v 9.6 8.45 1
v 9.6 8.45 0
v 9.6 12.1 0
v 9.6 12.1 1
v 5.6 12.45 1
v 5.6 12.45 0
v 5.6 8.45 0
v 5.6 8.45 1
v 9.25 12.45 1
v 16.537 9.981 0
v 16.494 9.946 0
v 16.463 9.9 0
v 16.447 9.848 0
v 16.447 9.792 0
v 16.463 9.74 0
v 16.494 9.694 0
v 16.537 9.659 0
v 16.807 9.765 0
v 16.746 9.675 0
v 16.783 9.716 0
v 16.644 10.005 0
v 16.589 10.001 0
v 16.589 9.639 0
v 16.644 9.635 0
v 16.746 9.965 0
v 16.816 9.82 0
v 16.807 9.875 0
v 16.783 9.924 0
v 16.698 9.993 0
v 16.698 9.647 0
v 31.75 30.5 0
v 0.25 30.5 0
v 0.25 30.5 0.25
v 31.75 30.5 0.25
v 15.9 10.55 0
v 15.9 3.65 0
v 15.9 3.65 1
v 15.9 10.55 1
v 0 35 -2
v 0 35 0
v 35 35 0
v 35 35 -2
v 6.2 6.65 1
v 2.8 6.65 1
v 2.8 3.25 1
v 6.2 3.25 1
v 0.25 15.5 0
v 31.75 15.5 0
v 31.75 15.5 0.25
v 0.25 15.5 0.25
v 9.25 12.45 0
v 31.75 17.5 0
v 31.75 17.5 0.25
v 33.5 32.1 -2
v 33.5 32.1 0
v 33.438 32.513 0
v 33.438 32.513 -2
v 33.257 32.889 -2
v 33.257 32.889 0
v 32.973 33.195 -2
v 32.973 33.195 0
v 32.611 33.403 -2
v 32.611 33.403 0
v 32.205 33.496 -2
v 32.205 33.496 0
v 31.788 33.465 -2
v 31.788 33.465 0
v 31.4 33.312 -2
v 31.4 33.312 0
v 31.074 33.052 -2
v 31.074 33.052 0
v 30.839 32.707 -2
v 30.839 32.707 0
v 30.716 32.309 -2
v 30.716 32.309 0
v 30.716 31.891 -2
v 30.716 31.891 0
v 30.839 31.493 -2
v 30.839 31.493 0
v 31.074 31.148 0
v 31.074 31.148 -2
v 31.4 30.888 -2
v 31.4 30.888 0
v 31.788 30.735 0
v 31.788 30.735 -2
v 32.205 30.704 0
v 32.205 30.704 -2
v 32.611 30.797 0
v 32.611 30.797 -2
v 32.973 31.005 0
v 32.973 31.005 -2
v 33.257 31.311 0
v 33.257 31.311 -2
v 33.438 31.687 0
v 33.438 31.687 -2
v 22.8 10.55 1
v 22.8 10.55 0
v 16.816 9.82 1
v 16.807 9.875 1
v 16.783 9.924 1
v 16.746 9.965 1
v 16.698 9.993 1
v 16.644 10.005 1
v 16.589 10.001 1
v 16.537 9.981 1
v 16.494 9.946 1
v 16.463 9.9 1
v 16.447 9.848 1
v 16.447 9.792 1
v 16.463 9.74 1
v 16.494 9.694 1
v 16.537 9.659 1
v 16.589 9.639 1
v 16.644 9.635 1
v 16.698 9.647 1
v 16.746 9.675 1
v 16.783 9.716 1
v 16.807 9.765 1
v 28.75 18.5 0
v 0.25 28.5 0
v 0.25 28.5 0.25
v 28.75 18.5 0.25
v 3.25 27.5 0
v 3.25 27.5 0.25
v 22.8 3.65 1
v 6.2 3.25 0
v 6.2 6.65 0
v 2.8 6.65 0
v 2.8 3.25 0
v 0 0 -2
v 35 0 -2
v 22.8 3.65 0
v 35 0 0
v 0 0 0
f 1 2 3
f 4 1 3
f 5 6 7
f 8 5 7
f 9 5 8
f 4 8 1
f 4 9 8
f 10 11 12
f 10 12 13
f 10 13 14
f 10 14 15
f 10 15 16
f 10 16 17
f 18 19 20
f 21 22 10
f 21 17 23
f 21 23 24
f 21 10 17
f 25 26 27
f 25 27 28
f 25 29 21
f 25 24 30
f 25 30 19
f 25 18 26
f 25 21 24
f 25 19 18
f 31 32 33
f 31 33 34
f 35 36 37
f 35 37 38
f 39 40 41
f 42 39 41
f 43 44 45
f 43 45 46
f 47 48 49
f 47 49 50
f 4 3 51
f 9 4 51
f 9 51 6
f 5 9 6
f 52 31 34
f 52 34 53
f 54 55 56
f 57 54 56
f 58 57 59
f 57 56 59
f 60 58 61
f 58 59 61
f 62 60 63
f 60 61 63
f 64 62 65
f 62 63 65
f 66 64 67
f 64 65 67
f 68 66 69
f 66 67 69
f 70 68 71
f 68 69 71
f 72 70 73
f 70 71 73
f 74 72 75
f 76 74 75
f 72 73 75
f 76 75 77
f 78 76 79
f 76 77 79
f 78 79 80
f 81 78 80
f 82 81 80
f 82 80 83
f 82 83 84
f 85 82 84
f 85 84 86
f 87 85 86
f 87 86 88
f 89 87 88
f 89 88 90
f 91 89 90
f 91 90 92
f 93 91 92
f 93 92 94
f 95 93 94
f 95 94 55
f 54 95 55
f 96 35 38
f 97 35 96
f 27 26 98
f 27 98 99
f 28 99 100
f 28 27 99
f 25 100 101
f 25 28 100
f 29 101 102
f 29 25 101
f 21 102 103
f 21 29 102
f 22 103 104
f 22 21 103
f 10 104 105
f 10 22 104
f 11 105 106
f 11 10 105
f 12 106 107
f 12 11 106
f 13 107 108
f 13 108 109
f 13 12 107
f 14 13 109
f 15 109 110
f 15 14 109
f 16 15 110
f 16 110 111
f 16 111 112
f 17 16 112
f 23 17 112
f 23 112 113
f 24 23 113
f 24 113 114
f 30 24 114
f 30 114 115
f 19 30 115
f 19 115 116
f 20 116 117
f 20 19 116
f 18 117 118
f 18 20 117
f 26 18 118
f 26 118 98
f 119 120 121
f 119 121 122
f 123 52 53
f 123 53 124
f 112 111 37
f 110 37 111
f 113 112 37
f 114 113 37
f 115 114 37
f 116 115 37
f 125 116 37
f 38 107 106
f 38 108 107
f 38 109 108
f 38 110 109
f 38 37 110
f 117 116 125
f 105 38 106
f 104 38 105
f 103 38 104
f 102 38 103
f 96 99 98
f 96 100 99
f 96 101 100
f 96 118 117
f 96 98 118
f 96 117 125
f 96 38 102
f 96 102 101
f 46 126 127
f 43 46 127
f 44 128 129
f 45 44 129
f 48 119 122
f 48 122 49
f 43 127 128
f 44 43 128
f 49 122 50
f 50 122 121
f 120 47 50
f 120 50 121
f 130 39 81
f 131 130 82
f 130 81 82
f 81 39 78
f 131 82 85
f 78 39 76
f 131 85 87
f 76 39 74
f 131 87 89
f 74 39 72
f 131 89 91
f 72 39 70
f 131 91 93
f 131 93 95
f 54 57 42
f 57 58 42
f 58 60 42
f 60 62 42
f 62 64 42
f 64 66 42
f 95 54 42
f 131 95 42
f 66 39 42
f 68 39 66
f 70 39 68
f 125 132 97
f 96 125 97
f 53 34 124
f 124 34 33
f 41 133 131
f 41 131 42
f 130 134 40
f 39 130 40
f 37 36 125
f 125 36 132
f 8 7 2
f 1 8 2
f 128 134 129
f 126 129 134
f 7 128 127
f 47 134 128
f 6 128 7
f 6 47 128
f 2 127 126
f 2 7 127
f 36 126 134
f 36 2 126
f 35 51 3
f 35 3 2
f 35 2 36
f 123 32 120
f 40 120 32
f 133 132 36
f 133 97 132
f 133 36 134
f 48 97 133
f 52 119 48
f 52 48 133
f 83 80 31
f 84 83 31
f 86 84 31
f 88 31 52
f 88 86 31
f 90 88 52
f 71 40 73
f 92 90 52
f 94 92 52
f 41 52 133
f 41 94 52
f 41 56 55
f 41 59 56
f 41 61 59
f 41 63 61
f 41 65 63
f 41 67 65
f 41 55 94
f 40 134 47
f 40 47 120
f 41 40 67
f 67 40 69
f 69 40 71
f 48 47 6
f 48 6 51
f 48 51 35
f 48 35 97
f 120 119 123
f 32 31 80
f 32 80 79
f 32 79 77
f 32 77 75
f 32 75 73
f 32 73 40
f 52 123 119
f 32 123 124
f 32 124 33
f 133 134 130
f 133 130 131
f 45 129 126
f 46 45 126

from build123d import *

# Parameters (mm, degrees)
MODEL_W             = 35
MODEL_H             = 35
BOSS_EXTRUDE1_DEPTH = 2
MODEL_3_R           = 1.4
CUT_EXTRUDE1_DEPTH  = 50.537864306
MODEL_4_W           = 6.9
MODEL_4_H           = 6.9
MODEL_4_R           = 0.1855
BOSS_EXTRUDE2_DEPTH = 1
BOSS_EXTRUDE3_DEPTH = 0.25


with BuildPart() as part:
    # Model → Boss-Extrude1 (new body)
    with BuildSketch(Plane.XY):
        with Locations((17.5, 17.5)):
            Rectangle(MODEL_W, MODEL_H)
    extrude(amount=-BOSS_EXTRUDE1_DEPTH)

    # Model<3> → Cut-Extrude1 (cut, through all)
    with BuildSketch(Plane.XY):
        with Locations((32.1, 32.1)):
            Circle(MODEL_3_R)
    extrude(amount=-CUT_EXTRUDE1_DEPTH, mode=Mode.SUBTRACT)

    # Model<4> → Boss-Extrude2 (add)
    # profile 1 of 3: a face of its own
    with BuildSketch(Plane.XY):
        with Locations((19.35, 7.1)):
            Rectangle(MODEL_4_W, MODEL_4_H)
        with Locations((16.63, 9.82)):
            Circle(MODEL_4_R, mode=Mode.SUBTRACT)
    # profile 2 of 3: a face of its own
    with BuildSketch(Plane.XY):
        Polygon((3.4508, 6.65), (2.8, 6.65), (2.8, 5.9992), (2.8, 3.9008), (2.8, 3.25), (3.4508, 3.25), (5.5492, 3.25), (6.2, 3.25), (6.2, 3.9008), (6.2, 6.65), align=None)
    # profile 3 of 3: a face of its own
    with BuildSketch(Plane.XY):
        Polygon((5.6, 8.8508), (5.6, 8.45), (6.0008, 8.45), (9.1992, 8.45), (9.6, 8.45), (9.6, 8.8508), (9.6, 12.049229733), (9.6, 12.1), (9.25, 12.45), (9.199229733, 12.45), (6.0008, 12.45), (5.6, 12.45), (5.6, 12.0492), align=None)
    extrude(amount=BOSS_EXTRUDE2_DEPTH)

    # Model<5> → Boss-Extrude3 (add)
    with BuildSketch(Plane.XY):
        Polygon((0.25, 28.5), (0.25, 15.5), (31.75, 15.5), (28.772474986, 18.477525014), (28.75, 18.5), (28.719974832, 18.510535147), align=None)
        Polygon((31.75, 30.5), (0.25, 30.5), (3.227525014, 27.522474986), (3.25, 27.5), (3.280025168, 27.489464853), (31.75, 17.5), align=None)
    extrude(amount=BOSS_EXTRUDE3_DEPTH)


solid = part.part
